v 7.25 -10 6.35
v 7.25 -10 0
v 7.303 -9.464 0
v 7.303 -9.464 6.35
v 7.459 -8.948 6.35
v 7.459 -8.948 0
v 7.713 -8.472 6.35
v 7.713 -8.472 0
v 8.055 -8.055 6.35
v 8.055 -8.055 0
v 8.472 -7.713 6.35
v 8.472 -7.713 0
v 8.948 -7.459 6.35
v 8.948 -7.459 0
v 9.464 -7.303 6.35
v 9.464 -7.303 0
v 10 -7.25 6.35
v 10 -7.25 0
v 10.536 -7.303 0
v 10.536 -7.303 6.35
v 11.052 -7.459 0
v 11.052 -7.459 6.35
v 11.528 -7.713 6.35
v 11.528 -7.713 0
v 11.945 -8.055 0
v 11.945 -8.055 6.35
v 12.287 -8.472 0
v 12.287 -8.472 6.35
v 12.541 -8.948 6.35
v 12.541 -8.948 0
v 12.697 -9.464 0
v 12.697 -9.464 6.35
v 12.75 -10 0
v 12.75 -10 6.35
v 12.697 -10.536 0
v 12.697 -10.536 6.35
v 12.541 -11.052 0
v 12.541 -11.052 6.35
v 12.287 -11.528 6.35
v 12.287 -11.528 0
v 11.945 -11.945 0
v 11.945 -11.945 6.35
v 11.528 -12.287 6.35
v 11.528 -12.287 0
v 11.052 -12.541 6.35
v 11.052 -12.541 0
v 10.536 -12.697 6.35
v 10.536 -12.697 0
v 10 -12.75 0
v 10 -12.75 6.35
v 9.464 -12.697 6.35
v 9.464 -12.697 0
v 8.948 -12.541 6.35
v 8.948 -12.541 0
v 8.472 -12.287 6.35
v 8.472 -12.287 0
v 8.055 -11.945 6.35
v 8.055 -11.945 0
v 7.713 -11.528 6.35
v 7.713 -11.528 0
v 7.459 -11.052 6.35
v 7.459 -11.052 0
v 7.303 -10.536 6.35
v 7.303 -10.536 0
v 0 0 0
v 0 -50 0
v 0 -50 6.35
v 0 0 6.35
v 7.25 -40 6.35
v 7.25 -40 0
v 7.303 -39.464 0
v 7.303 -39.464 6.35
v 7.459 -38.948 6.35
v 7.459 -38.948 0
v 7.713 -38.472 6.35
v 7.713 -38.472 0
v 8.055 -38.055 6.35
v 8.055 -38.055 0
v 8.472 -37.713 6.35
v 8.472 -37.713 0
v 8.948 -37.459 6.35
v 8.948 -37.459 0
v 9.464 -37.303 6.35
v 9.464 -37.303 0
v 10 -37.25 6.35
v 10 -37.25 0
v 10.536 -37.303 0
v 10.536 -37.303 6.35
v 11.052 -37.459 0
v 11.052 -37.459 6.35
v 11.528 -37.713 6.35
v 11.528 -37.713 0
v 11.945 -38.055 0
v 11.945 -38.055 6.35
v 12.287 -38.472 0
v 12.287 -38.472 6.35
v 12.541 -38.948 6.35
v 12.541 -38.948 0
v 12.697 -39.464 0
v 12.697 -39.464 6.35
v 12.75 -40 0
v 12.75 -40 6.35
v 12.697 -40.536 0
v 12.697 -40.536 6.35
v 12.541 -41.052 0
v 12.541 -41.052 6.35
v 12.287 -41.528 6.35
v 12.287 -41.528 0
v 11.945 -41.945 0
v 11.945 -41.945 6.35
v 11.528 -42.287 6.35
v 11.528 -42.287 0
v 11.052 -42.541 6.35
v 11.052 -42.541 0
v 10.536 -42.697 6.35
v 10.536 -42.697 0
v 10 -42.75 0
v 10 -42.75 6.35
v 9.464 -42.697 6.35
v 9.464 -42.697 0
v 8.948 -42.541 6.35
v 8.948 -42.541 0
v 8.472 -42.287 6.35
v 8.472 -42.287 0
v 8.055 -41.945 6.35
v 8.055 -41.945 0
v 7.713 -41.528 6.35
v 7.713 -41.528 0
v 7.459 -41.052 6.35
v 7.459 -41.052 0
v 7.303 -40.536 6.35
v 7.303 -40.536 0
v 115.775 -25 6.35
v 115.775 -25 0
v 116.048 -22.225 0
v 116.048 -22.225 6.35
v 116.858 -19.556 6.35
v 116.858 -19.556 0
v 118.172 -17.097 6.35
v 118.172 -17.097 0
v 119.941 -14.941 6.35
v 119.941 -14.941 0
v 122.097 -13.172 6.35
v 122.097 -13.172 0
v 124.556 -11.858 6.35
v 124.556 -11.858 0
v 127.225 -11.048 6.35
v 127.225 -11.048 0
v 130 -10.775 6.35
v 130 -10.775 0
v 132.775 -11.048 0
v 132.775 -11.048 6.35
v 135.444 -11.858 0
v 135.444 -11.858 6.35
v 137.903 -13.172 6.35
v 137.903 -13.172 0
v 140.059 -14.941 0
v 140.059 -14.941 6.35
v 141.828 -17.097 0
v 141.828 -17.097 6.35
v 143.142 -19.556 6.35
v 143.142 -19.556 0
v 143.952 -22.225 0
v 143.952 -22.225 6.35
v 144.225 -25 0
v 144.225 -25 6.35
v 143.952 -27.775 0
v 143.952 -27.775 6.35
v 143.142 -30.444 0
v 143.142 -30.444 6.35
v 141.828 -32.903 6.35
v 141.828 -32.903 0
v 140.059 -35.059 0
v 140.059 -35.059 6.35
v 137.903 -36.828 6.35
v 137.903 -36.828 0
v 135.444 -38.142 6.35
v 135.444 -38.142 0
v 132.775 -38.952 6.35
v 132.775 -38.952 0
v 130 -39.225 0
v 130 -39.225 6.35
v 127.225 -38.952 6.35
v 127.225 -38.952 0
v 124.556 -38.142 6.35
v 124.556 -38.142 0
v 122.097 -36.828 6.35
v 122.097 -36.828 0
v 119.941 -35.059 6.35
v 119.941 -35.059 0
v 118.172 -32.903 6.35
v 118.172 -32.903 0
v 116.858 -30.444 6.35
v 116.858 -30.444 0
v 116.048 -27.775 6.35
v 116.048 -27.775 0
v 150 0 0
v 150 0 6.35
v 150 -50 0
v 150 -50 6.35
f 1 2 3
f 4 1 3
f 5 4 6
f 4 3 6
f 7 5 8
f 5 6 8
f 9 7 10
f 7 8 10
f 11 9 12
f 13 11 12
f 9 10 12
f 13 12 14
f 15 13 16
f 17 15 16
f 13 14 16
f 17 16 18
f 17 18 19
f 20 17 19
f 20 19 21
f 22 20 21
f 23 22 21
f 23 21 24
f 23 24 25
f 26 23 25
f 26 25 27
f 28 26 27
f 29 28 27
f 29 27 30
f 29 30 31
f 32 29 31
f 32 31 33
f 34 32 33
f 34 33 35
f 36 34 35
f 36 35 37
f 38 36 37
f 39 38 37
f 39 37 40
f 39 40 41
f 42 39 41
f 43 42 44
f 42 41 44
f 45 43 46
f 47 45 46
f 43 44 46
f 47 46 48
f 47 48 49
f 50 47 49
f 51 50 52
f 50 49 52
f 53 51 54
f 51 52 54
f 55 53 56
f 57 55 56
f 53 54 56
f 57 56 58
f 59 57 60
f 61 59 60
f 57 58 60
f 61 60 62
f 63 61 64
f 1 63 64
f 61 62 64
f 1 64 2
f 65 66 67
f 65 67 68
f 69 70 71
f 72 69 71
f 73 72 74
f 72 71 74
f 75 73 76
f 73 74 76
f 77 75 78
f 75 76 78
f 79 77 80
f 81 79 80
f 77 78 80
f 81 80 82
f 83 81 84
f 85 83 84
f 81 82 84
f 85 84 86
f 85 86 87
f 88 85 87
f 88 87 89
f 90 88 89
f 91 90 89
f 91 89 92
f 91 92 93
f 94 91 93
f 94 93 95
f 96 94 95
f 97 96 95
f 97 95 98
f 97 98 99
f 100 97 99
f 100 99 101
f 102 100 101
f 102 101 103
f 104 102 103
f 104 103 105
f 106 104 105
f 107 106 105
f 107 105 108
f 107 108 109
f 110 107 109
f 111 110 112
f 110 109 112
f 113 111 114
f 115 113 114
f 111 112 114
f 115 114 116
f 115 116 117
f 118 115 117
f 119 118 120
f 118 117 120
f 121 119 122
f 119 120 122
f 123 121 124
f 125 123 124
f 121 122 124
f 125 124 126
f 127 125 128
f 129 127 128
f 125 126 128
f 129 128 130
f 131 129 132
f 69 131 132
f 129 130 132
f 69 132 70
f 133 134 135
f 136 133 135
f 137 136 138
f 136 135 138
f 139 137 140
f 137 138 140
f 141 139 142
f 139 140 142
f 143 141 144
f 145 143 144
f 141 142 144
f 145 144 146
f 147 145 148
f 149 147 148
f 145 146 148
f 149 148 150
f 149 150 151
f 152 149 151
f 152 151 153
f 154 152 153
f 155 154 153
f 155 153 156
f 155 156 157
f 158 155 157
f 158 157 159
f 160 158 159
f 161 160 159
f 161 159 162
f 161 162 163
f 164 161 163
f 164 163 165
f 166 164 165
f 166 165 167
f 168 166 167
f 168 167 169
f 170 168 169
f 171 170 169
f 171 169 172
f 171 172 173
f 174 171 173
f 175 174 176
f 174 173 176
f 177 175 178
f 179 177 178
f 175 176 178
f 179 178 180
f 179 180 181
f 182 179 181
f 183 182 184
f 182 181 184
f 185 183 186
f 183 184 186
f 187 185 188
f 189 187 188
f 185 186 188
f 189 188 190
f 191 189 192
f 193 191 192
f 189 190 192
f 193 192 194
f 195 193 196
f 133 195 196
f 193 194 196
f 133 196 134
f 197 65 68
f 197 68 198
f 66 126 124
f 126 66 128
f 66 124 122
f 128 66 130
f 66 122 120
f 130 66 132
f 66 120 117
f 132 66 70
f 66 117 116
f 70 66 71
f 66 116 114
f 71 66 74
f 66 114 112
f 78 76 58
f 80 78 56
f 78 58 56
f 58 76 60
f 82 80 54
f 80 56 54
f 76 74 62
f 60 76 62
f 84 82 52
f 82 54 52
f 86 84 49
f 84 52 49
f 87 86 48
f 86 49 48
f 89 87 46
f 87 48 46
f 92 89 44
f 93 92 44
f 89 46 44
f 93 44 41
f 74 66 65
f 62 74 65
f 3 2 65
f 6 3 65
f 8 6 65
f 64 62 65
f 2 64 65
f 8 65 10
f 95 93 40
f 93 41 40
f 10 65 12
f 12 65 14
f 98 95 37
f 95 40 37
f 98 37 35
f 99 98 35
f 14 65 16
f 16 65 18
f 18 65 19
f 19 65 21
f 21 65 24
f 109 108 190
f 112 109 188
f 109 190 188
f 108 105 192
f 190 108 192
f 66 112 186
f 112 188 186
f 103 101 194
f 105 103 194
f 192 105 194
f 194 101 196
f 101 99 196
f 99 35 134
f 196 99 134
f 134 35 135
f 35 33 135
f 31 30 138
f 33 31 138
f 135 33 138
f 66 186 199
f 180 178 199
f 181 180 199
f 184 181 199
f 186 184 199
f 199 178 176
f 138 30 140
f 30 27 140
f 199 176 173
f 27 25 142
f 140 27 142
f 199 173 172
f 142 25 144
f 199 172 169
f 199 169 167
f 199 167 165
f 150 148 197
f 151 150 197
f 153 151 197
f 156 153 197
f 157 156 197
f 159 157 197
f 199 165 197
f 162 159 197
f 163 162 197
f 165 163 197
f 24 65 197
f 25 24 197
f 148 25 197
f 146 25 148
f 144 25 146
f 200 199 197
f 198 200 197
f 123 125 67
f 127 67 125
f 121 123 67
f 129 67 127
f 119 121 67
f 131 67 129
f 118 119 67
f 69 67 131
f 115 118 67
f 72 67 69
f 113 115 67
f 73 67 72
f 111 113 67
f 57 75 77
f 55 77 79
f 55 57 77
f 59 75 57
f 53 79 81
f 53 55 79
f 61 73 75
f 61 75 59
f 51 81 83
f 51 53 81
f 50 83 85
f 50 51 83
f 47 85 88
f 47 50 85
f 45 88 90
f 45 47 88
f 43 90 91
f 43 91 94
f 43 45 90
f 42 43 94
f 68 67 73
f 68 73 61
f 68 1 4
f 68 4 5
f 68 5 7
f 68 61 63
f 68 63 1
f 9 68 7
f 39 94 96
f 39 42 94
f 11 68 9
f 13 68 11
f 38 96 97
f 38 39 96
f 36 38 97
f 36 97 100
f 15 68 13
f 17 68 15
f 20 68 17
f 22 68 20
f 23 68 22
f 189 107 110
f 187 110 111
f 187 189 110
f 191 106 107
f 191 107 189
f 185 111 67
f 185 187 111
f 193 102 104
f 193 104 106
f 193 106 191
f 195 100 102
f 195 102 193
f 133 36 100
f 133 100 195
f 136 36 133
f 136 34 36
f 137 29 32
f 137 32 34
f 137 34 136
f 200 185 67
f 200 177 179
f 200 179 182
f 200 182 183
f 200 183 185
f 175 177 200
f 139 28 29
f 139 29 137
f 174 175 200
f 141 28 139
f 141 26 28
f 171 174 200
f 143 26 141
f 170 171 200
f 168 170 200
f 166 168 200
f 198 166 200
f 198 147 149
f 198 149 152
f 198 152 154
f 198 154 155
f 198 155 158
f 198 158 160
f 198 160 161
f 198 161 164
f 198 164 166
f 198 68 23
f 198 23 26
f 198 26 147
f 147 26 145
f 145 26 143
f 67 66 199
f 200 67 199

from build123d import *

# Parameters (mm, degrees)
SKETCH1_W           = 150
SKETCH1_H           = 50
BOSS_EXTRUDE1_DEPTH = 6.35
SKETCH2_R           = 14.225
CUT_EXTRUDE1_DEPTH  = 7.35
SKETCH3_R           = 2.75
CUT_EXTRUDE2_DEPTH  = 7.35


with BuildPart() as part:
    # Sketch1 → Boss-Extrude1 (new body)
    with BuildSketch(Plane.XY):
        with Locations((75, -25)):
            Rectangle(SKETCH1_W, SKETCH1_H)
    extrude(amount=BOSS_EXTRUDE1_DEPTH)

    # Sketch2 → Cut-Extrude1 (cut, through all)
    with BuildSketch(Plane(origin=(0, 0, 0), x_dir=(-1, 0, 0), z_dir=(0, 0, -1))):
        with Locations((-130, -25)):
            Circle(SKETCH2_R)
    extrude(amount=-CUT_EXTRUDE1_DEPTH, mode=Mode.SUBTRACT)

    # Sketch3 → Cut-Extrude2 (cut, through all)
    with BuildSketch(Plane(origin=(0, 0, 0), x_dir=(-1, 0, 0), z_dir=(0, 0, -1))):
        with Locations((-10, -10)):
            Circle(SKETCH3_R)
        with Locations((-10, -40)):
            Circle(SKETCH3_R)
    extrude(amount=-CUT_EXTRUDE2_DEPTH, mode=Mode.SUBTRACT)


solid = part.part
